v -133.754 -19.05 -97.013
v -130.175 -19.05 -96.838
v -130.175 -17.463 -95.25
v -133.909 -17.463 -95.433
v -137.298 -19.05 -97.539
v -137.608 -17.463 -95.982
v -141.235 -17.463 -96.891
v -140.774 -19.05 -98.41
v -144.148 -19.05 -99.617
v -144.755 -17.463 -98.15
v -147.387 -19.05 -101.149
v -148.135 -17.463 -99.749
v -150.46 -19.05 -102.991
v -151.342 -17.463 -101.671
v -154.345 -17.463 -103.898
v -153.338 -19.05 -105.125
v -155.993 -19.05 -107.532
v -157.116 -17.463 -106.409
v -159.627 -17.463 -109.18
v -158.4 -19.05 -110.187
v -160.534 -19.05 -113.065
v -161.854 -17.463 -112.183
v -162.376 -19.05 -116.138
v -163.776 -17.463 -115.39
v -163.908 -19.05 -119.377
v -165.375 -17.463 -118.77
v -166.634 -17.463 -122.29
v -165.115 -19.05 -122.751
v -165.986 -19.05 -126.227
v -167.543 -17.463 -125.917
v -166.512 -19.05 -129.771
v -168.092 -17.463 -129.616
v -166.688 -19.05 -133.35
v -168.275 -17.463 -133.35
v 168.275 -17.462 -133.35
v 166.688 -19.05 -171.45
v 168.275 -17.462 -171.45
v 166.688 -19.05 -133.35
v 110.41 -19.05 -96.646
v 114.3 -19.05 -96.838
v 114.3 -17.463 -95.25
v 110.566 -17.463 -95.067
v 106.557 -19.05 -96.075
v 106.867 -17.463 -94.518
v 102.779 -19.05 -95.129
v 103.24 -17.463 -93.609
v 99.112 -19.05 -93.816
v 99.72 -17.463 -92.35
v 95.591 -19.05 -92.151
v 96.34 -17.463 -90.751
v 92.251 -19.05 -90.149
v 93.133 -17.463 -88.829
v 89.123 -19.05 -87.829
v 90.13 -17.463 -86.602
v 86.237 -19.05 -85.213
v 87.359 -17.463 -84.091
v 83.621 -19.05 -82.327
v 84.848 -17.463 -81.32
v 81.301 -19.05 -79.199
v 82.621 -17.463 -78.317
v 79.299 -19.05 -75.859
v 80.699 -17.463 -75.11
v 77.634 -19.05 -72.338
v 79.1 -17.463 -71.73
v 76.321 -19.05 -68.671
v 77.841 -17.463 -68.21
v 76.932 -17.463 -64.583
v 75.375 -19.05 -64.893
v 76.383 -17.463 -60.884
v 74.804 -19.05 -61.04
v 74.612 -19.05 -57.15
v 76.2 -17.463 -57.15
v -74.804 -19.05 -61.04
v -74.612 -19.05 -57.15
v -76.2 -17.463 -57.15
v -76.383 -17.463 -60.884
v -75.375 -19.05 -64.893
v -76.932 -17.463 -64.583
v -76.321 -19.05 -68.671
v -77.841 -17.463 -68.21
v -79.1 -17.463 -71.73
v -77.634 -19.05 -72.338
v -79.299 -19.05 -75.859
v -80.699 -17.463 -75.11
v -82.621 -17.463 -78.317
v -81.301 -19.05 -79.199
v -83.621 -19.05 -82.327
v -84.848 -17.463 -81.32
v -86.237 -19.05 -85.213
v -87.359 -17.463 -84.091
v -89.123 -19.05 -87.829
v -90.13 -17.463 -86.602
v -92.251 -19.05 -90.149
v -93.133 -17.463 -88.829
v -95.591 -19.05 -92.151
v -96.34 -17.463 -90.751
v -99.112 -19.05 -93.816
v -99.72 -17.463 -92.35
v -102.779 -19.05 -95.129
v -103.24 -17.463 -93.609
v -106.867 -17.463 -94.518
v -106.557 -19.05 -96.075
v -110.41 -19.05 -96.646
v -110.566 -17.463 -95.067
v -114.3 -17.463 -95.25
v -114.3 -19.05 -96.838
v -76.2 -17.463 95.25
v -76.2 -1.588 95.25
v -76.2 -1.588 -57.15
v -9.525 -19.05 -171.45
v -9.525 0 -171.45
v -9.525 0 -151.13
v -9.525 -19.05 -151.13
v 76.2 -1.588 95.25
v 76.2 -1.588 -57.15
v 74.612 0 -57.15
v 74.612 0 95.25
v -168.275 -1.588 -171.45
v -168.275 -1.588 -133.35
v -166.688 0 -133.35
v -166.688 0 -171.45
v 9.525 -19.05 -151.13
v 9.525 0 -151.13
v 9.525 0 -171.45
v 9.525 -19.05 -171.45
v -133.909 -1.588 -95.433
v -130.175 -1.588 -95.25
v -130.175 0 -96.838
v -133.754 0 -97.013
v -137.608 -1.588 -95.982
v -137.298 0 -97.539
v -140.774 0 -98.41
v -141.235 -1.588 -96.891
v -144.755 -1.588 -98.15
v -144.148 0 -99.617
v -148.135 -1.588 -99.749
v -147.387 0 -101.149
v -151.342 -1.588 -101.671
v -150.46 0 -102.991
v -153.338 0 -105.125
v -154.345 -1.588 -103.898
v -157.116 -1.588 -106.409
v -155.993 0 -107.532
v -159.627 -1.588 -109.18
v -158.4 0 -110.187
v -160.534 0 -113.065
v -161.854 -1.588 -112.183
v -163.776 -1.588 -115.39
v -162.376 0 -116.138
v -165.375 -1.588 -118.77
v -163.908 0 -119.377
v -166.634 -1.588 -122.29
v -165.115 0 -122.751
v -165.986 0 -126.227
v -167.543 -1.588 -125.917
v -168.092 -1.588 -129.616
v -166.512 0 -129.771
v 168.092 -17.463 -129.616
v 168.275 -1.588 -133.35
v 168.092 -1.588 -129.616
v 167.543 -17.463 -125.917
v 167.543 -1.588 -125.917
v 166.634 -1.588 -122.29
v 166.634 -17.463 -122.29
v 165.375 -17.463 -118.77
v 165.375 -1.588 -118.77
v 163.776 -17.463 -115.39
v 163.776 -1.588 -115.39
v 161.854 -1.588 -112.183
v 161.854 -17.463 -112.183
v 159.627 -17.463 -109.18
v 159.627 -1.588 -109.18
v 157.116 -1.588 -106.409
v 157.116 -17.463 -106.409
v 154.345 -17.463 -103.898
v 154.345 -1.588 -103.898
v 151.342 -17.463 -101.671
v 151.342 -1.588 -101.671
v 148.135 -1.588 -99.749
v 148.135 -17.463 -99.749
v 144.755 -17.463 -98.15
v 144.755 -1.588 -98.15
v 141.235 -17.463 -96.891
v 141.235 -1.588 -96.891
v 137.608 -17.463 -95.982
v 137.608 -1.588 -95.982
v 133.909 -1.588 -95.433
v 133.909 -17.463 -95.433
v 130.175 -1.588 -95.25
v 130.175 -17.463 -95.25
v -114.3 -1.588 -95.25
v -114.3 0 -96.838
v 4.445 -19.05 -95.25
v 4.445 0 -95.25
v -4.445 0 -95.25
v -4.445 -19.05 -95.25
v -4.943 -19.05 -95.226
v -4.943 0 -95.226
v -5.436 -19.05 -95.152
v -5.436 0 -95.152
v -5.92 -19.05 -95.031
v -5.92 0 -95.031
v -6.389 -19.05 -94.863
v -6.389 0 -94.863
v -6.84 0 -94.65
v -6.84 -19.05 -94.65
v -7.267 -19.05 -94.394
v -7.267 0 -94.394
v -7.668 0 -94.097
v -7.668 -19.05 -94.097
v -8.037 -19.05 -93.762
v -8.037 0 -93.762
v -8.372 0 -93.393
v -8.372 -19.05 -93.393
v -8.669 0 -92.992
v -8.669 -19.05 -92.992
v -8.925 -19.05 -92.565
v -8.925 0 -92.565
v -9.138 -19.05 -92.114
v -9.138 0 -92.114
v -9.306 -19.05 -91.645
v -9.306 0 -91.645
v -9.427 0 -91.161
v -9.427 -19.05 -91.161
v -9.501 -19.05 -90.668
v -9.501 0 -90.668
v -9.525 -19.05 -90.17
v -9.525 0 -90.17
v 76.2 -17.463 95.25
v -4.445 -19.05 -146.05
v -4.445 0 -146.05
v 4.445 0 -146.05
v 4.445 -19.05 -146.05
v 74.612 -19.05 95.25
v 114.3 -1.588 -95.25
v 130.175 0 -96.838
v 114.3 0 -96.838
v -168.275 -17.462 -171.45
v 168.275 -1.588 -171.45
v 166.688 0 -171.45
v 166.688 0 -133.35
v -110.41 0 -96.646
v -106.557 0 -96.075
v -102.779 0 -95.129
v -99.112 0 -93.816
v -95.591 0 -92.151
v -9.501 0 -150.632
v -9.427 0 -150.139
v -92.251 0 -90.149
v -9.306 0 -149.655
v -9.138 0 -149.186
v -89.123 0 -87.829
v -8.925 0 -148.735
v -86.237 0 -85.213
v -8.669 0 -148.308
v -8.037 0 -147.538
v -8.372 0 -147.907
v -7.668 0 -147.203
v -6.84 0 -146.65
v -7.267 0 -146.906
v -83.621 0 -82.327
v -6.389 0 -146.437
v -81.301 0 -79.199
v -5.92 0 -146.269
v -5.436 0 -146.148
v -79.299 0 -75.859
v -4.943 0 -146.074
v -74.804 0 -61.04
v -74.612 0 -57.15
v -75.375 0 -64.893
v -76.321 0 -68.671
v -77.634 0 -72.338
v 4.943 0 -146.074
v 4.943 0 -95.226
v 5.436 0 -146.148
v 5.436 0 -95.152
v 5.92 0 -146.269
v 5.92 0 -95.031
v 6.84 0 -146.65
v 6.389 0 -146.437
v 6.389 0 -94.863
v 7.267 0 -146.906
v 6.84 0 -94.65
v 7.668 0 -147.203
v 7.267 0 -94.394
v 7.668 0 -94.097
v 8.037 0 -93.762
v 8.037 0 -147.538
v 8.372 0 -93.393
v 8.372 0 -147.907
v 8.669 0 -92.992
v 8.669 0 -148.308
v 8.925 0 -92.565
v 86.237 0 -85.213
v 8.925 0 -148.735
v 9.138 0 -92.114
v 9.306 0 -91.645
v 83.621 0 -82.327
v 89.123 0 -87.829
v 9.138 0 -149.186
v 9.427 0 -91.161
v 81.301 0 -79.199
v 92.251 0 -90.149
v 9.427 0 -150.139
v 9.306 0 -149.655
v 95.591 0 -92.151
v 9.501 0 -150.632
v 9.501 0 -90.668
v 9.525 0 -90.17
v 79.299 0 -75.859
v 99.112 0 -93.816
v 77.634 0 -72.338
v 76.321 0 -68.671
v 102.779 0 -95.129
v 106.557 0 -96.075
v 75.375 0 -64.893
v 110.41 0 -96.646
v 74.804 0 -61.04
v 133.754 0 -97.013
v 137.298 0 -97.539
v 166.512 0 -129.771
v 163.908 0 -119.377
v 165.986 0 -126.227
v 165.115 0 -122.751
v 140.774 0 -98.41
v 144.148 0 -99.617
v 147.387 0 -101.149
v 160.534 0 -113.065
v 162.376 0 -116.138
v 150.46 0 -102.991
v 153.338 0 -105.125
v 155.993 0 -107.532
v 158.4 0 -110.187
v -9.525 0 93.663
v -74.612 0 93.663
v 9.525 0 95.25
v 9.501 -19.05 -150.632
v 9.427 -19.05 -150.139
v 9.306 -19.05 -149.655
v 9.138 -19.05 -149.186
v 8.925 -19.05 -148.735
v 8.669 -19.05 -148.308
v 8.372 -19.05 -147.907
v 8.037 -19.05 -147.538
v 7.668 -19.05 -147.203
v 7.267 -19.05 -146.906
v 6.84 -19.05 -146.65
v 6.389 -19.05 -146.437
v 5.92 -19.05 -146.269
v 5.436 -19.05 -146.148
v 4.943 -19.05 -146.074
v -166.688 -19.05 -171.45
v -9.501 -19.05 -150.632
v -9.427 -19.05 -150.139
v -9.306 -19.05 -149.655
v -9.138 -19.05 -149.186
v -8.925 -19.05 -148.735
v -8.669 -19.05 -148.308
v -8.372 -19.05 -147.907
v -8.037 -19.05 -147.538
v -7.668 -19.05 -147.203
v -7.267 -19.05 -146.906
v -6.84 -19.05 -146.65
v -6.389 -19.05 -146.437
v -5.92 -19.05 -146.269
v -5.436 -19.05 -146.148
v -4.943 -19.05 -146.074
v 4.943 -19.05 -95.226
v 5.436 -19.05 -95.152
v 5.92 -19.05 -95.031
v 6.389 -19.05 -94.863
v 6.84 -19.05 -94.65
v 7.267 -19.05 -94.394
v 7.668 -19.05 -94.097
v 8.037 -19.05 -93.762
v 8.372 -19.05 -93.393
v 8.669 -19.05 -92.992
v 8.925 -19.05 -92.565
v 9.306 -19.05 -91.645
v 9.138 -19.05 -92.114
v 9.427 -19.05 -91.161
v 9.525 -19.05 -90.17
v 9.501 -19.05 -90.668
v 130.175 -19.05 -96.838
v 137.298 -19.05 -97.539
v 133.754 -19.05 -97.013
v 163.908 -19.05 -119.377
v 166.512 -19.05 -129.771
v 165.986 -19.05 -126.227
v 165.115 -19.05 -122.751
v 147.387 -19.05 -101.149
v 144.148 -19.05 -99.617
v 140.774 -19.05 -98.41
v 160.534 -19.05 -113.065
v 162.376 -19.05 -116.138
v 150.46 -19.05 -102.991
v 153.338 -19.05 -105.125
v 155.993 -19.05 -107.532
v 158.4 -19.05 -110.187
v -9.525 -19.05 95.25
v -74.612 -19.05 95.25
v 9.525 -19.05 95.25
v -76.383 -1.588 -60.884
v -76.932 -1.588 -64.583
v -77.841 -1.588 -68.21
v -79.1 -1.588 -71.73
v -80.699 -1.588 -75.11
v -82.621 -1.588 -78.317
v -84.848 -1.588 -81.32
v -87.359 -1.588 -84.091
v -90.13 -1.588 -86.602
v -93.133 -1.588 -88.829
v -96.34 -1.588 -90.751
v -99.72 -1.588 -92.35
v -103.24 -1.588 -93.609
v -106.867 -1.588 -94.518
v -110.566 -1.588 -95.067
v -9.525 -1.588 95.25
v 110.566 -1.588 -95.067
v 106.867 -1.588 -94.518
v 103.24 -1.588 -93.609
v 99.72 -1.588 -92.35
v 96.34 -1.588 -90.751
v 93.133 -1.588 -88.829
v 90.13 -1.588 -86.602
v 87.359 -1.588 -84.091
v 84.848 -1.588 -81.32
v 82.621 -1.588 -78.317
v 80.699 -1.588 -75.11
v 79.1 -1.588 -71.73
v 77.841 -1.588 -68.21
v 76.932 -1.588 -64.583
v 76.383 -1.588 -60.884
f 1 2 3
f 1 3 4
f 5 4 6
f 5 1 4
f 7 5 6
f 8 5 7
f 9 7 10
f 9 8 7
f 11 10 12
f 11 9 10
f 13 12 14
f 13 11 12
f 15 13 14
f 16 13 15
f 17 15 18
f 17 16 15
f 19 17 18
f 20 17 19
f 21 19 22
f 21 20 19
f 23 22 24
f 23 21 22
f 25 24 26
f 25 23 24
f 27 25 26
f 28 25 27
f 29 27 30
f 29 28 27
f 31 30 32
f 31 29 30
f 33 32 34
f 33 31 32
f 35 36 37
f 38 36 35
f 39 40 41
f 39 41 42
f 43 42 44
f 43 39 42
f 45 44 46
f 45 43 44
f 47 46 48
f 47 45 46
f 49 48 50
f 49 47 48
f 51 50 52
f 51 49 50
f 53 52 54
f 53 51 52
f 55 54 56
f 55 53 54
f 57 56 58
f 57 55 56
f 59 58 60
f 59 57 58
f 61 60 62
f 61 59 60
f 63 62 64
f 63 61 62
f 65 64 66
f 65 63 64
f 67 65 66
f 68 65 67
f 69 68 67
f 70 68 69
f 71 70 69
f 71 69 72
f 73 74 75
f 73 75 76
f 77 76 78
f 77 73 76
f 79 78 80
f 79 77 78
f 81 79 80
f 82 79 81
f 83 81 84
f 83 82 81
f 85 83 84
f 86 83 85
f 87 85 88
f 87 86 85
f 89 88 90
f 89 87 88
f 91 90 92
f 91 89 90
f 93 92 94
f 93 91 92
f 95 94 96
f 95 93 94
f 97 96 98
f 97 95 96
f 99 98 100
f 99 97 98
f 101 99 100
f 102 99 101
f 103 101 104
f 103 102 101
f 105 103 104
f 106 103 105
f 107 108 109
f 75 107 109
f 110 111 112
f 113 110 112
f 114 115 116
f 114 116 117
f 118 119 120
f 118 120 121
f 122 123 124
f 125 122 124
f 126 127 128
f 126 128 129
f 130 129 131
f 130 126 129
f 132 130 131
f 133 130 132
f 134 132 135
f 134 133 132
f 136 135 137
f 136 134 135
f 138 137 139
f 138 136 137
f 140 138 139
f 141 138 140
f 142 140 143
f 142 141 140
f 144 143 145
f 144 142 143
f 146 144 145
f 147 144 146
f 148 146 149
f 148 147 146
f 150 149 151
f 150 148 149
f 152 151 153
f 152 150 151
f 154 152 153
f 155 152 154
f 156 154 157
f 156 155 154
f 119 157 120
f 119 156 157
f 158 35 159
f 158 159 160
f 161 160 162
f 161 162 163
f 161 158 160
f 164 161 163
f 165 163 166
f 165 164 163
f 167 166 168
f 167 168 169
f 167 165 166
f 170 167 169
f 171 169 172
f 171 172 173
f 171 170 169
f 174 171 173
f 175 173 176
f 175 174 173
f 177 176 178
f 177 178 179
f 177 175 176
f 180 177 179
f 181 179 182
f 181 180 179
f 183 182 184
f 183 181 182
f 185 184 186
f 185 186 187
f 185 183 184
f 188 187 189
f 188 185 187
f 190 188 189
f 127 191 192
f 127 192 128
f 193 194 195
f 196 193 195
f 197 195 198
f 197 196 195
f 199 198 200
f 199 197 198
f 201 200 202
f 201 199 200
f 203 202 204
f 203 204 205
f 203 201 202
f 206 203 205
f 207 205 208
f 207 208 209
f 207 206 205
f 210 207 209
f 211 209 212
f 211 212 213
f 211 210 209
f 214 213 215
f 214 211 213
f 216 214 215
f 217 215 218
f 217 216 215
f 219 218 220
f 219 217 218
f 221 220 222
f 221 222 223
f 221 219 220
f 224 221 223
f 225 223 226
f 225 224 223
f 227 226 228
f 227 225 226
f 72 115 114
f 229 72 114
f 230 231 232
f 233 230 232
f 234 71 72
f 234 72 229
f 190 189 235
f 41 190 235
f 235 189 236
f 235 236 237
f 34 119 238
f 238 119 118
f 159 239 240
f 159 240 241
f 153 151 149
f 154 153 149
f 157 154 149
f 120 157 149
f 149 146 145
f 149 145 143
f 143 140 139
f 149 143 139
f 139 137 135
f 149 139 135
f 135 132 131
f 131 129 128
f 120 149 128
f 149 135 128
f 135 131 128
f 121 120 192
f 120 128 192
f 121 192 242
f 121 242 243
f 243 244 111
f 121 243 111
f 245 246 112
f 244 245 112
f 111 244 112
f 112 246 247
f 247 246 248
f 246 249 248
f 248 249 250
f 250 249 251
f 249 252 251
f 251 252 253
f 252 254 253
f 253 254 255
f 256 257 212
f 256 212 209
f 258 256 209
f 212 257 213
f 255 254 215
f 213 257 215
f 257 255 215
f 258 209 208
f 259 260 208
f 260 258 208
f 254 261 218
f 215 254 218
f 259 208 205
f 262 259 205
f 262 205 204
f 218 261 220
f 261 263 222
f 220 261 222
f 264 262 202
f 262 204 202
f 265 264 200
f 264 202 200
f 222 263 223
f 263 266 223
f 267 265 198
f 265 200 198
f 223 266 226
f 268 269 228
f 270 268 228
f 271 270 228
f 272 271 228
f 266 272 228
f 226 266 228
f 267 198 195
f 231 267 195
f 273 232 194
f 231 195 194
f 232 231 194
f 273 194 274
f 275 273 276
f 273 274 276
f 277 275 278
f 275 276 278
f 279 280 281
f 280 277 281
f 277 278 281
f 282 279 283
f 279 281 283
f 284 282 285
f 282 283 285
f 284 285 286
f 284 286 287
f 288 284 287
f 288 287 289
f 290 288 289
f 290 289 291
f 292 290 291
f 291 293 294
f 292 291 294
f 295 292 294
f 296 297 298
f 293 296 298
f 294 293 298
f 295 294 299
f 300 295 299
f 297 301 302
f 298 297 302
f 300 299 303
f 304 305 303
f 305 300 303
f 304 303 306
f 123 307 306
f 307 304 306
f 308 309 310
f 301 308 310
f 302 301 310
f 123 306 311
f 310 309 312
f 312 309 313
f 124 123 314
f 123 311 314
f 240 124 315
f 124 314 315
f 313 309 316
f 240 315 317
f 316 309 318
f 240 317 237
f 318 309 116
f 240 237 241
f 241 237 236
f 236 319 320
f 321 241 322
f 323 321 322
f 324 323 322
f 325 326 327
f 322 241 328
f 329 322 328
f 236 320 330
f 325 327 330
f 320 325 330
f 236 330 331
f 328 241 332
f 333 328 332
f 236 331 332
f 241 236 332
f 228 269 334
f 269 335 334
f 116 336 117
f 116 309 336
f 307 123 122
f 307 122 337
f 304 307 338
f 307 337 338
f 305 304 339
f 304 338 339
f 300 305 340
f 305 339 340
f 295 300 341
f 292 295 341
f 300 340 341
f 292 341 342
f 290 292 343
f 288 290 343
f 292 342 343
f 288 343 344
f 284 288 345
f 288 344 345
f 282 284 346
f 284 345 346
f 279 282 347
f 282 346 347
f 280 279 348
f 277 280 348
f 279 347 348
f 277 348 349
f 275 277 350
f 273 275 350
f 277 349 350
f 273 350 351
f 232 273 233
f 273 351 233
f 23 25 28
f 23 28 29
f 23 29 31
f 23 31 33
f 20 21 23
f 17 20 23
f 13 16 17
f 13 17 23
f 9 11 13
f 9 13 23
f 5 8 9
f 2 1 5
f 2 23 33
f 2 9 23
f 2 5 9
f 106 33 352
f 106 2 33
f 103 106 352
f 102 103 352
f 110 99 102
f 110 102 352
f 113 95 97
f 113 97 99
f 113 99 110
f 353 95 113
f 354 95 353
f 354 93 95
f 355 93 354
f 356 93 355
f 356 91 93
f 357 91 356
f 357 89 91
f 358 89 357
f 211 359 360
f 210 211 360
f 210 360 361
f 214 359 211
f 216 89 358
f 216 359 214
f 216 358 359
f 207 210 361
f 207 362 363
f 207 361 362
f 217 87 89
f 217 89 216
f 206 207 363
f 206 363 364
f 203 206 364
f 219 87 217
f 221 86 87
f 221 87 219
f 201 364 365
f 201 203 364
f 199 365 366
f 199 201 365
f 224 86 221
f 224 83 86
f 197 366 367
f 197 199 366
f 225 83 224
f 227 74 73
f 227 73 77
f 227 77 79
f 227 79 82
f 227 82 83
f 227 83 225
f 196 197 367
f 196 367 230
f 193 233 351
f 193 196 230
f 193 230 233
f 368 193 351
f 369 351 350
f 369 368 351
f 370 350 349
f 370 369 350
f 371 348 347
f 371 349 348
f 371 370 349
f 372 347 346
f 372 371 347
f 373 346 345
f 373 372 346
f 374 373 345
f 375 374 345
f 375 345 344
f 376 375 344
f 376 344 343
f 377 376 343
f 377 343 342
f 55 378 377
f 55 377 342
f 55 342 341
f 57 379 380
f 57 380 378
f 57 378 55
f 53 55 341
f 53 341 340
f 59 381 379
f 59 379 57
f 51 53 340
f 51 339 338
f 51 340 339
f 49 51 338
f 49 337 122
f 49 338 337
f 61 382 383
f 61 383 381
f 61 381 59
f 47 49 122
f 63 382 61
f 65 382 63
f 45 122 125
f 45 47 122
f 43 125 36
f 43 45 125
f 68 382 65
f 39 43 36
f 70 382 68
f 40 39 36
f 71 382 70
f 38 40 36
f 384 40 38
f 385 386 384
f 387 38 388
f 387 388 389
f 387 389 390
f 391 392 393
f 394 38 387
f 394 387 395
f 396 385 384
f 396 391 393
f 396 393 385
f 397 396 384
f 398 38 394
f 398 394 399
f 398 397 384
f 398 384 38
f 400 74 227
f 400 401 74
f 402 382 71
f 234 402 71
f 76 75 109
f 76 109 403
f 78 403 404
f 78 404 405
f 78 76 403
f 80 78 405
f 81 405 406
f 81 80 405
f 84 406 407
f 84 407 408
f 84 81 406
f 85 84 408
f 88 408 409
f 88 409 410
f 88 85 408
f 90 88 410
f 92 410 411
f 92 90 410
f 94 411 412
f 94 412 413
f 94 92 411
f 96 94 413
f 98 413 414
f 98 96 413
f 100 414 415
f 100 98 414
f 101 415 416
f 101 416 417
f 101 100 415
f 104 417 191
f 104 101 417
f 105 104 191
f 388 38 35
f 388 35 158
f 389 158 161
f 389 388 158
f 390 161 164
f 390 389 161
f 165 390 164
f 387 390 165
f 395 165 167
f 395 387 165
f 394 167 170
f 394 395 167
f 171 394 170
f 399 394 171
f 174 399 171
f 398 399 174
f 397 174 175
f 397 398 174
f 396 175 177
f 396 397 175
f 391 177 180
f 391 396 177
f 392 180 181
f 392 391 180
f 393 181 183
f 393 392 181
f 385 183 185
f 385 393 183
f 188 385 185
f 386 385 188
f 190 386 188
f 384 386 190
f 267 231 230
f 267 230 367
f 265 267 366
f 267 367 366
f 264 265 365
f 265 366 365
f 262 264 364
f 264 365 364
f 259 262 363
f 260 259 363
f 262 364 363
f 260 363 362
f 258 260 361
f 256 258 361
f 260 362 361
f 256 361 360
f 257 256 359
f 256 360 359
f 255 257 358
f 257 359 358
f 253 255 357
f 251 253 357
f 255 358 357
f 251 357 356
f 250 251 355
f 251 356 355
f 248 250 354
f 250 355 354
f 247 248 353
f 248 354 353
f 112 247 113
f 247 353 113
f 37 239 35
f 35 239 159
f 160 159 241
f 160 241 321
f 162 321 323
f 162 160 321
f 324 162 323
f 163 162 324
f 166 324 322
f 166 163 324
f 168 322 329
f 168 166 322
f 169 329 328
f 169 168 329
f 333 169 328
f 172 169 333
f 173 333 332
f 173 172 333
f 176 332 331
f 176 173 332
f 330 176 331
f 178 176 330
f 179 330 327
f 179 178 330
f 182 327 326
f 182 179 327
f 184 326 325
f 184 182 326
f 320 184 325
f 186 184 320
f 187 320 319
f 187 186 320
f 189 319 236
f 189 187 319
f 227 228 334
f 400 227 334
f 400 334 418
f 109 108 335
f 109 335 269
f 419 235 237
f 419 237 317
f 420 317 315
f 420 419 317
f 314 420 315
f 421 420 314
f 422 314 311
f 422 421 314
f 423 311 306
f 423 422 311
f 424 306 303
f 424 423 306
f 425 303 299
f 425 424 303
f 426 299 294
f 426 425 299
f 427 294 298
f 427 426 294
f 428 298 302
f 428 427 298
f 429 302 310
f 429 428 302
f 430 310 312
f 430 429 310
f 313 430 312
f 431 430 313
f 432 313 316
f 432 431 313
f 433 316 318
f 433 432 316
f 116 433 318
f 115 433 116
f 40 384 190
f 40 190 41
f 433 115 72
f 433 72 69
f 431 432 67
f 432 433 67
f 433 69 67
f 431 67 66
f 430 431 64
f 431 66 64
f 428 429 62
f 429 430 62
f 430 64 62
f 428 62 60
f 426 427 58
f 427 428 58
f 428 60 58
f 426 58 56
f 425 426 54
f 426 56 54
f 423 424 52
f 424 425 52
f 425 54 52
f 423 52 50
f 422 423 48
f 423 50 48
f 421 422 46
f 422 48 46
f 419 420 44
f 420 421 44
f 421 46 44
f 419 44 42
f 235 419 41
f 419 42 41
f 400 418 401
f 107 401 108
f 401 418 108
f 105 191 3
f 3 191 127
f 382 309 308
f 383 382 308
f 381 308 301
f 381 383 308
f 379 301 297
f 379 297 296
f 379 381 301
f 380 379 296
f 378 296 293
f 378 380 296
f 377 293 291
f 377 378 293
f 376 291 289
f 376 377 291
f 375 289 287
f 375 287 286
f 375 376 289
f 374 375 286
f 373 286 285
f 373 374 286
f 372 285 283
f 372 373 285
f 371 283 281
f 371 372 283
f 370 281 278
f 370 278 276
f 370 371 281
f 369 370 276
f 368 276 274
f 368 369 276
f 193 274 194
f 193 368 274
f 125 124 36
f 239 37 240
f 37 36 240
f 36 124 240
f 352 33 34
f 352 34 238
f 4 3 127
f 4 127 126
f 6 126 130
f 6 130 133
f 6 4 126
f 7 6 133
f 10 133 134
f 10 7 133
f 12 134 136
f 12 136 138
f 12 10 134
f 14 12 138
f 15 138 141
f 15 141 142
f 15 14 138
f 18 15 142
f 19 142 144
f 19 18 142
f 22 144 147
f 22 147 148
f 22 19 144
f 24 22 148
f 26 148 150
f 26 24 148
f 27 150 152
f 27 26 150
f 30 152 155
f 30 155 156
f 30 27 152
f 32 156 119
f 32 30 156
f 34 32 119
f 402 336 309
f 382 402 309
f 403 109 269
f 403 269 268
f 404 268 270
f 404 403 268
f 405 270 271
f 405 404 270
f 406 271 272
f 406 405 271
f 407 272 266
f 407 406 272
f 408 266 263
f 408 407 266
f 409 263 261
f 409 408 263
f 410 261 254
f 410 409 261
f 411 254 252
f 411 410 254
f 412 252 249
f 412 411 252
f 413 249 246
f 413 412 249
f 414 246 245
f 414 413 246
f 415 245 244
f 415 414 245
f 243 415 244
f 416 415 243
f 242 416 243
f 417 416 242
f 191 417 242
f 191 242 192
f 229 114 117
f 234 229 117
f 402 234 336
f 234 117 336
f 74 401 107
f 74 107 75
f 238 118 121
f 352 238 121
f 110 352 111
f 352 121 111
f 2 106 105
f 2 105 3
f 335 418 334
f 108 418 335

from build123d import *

# Parameters (mm, degrees)
F1_DEPTH = 19.05
F2_R     = 38.1
F3_R     = 5.08
F4_SIZE  = 1.5875


with BuildPart() as f1:
    # F0 (on Front) → F1 (new body)
    with BuildSketch(Plane.XZ):
        Polygon((76.2, -95.25), (76.2, 95.25), (9.525, 95.25), (9.525, -95.25), (-9.525, -95.25), (-9.525, 95.25), (-76.2, 95.25), (-76.2, -95.25), (-168.275, -95.25), (-168.275, -171.45), (-9.525, -171.45), (-9.525, -146.05), (9.525, -146.05), (9.525, -171.45), (168.275, -171.45), (168.275, -95.25), align=None)
    extrude(amount=F1_DEPTH)

    # F2
    f2_edges = [f1.edges().sort_by_distance(p)[0] for p in [
        (-168.275, -9.525, -95.25),
        (-76.2, -9.525, -95.25),
        (76.2, -9.525, -95.25),
        (168.275, -9.525, -95.25),
    ]]
    fillet(f2_edges, radius=F2_R)

    # F3
    f3_edges = [f1.edges().sort_by_distance(p)[0] for p in [
        (9.525, -9.525, -95.25),
        (-9.525, -9.525, -95.25),
        (-9.525, -9.525, -146.05),
        (9.525, -9.525, -146.05),
    ]]
    fillet(f3_edges, radius=F3_R)

    # F4
    f4_edges = [f1.edges().sort_by_distance(p)[0] for p in [
        (-122.2375, -19.05, -95.25),
        (122.2375, -19.05, -95.25),
        (122.2375, 0, -95.25),
        (-42.8625, 0, 95.25),
        (-76.2, 0, 19.05),
        (-122.2375, 0, -95.25),
    ]]
    chamfer(f4_edges, length=F4_SIZE)


solid = f1.part
